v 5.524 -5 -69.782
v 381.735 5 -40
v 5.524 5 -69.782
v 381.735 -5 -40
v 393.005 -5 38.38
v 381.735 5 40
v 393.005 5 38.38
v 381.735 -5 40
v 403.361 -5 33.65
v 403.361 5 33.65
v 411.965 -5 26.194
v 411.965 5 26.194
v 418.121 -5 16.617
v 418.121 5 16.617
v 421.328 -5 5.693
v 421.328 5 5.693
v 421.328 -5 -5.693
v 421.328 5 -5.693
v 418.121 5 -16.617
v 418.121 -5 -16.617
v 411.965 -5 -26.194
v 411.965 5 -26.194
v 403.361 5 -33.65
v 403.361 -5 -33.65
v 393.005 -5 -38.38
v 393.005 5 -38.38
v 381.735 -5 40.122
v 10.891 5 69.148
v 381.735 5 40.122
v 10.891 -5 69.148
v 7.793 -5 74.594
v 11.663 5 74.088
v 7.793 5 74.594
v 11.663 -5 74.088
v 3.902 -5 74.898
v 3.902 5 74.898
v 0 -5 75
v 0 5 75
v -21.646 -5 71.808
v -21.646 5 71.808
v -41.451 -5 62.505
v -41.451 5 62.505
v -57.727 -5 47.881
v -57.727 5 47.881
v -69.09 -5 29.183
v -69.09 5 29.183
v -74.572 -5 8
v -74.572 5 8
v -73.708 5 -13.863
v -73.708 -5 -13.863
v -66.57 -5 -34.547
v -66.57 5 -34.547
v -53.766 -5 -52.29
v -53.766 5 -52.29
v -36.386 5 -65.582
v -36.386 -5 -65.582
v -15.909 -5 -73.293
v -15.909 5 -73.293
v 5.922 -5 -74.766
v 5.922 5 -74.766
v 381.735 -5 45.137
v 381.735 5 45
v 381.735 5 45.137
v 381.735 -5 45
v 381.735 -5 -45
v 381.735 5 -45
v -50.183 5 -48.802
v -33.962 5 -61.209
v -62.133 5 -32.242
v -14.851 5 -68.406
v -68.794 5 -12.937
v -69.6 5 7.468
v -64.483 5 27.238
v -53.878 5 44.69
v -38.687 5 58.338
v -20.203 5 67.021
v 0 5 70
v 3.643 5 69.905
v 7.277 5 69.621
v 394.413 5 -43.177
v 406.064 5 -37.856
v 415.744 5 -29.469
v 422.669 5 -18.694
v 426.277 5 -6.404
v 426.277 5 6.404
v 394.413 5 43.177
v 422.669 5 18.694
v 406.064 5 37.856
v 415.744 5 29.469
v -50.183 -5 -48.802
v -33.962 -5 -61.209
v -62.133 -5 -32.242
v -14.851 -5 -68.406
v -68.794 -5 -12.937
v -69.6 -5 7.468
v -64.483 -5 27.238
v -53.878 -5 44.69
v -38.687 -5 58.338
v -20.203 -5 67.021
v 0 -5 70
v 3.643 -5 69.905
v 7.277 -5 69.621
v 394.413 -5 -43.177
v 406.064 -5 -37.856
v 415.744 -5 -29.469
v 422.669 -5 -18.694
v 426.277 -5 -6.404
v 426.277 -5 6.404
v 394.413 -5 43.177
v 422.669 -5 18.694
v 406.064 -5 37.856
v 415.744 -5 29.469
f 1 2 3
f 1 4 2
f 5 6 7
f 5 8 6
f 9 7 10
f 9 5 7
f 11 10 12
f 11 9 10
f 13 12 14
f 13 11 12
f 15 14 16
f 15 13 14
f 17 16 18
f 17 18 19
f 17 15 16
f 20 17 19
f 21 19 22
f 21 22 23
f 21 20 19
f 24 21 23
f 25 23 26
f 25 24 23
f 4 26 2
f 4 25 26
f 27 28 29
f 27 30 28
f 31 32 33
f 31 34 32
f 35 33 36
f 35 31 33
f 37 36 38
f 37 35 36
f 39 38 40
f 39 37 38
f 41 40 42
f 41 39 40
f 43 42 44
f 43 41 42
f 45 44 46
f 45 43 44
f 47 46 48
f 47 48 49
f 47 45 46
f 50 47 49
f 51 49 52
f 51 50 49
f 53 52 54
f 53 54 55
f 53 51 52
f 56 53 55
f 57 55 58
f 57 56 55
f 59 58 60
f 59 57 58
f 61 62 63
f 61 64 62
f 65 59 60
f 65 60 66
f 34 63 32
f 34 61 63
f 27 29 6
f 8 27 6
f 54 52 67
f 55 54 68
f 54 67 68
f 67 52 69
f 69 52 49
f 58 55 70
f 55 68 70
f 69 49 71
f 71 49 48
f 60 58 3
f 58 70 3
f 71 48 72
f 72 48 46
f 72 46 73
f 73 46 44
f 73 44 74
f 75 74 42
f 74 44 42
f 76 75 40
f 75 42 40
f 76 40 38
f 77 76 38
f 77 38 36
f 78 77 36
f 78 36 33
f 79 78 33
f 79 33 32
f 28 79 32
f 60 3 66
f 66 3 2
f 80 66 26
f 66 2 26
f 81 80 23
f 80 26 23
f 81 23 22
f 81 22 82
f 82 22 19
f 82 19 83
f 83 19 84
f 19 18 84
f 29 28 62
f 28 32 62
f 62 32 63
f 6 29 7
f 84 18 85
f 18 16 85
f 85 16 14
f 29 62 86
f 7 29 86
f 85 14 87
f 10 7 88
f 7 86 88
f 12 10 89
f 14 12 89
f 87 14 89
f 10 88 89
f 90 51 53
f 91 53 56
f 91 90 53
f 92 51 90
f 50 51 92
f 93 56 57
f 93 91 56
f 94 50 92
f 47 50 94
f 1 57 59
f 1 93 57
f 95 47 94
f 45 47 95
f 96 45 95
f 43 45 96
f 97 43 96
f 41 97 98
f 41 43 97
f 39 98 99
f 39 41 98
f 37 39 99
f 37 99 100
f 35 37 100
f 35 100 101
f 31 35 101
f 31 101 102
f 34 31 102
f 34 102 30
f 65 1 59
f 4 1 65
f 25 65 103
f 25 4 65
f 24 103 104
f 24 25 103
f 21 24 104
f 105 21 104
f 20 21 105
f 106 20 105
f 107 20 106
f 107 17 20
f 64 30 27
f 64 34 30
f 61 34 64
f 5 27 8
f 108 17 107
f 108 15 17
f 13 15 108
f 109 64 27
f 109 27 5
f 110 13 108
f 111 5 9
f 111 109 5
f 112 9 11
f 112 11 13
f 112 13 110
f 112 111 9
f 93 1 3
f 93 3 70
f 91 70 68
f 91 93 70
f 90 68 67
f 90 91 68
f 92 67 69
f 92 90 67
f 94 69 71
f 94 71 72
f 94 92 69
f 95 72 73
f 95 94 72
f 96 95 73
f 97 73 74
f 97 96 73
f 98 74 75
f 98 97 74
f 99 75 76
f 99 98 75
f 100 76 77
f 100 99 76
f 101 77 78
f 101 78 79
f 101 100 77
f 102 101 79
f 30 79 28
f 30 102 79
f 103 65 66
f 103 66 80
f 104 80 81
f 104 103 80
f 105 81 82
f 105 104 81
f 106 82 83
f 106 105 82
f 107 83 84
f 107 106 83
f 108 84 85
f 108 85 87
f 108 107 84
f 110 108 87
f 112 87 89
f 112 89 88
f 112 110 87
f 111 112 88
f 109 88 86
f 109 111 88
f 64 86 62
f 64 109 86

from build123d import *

# Parameters (mm, degrees)
F1_DEPTH = 5


with BuildPart() as f1:
    # F0 (on Front) → F1 (new body, symmetric)
    with BuildSketch(Plane.XZ):
        with BuildLine():
            Line((0, 75), (11.6628740197, 74.0876330409))
            ThreePointArc((11.6628740197, 74.0876330409), (5.8492530264, 74.7715603624), (0, 75))
        make_face()
        with BuildLine():
            Line((381.7354142666, 45.1374825353), (11.6628740197, 74.0876330409))
            Line((11.6628740197, 74.0876330409), (0, 75))
            ThreePointArc((0, 75), (-74.9414408269, -2.9631818699), (5.9217365004, -74.7658547522))
            Line((5.9217365004, -74.7658547522), (381.7354142666, -45))
            ThreePointArc((381.7354142666, -45), (426.7354142666, 0), (381.7354142666, 45))
            Line((381.7354142666, 45), (381.7354142666, 45.1374825353))
        make_face()
        with BuildLine():
            ThreePointArc((5.5240677228, -69.7816929846), (-69.9454019537, -2.7641898524), (0, 70))
            ThreePointArc((0, 70), (5.4620559663, 69.7865742433), (10.8908049775, 69.1475984178))
            Line((10.8908049775, 69.1475984178), (381.7354142666, 40.1223305537))
            Line((381.7354142666, 40.1223305537), (381.7354142666, 40))
            ThreePointArc((381.7354142666, 40), (421.7354142666, 0), (381.7354142666, -40))
            Line((381.7354142666, -40), (5.5240677228, -69.7816929846))
        make_face(mode=Mode.SUBTRACT)
    extrude(amount=F1_DEPTH, both=True)


solid = f1.part
